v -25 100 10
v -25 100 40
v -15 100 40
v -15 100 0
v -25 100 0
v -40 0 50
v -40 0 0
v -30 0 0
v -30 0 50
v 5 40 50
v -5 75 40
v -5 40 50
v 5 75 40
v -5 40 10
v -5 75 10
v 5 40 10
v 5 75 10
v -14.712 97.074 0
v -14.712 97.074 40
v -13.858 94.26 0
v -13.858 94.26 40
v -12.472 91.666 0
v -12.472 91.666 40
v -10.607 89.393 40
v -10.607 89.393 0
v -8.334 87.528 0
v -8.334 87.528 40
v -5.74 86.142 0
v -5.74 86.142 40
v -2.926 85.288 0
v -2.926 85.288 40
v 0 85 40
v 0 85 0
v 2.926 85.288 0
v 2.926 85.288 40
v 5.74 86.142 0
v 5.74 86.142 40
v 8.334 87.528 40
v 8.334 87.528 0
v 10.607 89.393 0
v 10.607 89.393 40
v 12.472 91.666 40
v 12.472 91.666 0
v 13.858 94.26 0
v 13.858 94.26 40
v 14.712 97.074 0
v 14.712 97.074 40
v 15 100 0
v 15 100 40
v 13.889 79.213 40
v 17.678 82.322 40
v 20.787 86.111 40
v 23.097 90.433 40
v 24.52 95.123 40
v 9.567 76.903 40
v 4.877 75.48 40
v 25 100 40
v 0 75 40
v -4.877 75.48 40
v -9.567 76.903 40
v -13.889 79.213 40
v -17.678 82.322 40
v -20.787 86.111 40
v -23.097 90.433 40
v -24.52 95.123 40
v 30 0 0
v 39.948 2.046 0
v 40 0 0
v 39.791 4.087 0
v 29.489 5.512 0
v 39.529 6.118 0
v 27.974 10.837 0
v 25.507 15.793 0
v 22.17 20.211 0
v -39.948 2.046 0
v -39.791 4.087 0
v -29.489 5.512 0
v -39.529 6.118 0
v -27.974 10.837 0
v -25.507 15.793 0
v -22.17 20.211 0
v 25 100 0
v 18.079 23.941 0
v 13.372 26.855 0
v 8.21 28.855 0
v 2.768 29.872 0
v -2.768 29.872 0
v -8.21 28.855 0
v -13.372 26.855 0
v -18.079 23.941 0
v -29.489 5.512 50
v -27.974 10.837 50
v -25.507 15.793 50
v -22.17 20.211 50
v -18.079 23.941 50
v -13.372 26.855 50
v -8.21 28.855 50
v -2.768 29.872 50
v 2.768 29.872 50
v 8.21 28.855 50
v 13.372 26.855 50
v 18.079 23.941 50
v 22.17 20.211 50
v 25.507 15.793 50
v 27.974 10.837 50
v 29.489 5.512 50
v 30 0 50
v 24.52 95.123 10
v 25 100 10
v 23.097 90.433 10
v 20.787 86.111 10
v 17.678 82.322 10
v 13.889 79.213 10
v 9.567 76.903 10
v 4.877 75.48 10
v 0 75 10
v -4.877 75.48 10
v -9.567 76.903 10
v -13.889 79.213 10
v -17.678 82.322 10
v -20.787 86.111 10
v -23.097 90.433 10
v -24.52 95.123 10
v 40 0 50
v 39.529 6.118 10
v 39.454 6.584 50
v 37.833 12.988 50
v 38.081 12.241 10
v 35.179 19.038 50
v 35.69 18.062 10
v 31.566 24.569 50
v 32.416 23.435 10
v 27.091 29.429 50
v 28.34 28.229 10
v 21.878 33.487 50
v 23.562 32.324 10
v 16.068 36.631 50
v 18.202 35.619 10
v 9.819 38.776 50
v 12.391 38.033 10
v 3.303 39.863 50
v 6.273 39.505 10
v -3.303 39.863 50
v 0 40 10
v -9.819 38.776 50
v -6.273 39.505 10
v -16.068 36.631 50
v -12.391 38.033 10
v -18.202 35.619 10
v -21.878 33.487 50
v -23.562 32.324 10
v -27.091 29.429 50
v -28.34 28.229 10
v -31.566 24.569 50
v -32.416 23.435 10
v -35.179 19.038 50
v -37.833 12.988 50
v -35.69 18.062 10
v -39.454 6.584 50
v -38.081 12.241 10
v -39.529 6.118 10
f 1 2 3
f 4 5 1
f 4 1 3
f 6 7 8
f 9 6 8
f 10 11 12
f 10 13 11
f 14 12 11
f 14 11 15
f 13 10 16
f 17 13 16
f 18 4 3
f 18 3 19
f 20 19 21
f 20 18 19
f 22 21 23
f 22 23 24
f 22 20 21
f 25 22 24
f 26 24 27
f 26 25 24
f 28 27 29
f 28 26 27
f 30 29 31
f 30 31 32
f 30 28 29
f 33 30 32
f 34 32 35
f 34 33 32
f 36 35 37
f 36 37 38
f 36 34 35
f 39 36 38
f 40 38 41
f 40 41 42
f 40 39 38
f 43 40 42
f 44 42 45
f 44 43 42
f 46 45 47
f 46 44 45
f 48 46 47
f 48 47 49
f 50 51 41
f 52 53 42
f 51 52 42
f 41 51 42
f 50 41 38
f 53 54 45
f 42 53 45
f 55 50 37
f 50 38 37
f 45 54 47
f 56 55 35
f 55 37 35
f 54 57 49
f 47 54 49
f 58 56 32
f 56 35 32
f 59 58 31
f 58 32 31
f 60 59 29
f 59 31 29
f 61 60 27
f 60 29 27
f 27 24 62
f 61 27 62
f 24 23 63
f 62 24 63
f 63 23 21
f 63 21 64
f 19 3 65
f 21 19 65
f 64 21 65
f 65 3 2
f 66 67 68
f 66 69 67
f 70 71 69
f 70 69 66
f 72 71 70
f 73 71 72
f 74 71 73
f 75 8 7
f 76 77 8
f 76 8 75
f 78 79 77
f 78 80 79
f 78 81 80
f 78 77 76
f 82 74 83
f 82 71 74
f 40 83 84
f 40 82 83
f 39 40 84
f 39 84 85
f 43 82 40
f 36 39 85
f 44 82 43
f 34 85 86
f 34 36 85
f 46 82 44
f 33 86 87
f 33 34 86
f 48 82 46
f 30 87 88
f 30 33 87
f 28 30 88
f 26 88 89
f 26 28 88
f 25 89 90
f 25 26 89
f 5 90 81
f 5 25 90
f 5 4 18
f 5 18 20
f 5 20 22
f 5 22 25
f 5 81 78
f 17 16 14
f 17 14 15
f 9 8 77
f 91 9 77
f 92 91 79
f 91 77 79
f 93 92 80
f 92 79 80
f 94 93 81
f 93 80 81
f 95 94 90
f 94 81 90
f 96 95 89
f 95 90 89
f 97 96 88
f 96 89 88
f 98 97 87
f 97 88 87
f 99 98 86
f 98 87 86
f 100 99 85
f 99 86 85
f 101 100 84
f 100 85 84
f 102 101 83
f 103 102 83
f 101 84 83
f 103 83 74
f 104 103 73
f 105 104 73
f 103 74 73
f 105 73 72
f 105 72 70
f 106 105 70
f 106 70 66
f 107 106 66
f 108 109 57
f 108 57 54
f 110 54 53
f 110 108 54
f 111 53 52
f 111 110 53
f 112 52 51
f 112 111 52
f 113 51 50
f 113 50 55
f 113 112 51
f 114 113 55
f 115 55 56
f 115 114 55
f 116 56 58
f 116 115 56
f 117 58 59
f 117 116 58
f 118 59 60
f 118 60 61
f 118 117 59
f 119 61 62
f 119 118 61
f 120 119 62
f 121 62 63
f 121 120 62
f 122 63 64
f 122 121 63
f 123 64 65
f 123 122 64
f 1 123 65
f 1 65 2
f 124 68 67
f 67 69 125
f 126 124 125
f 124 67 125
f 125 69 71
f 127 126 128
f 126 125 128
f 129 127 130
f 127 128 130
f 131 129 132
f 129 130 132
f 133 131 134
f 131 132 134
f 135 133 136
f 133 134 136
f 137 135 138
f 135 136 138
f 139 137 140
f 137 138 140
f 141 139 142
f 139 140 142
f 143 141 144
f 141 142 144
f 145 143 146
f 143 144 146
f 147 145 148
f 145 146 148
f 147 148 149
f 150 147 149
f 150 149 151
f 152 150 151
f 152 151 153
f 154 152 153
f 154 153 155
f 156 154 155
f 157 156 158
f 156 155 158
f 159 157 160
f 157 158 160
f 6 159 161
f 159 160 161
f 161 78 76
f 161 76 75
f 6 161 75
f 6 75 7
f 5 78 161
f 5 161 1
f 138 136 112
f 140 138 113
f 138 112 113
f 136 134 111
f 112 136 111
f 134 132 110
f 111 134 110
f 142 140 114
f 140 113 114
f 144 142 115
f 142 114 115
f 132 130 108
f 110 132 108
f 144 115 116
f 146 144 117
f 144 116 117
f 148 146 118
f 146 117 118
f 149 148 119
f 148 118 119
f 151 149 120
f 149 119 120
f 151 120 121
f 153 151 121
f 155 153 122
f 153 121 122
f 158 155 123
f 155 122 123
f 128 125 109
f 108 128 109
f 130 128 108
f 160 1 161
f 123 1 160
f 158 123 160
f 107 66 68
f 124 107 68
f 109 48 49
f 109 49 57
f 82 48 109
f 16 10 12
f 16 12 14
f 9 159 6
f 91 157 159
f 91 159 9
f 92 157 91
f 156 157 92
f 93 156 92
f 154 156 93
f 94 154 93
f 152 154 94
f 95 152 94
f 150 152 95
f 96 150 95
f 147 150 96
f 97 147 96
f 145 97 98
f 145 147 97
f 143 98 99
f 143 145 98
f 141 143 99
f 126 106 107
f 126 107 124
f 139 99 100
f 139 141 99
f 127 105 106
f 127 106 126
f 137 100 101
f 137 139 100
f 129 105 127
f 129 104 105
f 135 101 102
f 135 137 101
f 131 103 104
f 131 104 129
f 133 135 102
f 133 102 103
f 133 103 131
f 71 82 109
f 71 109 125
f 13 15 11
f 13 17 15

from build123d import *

# Parameters (mm, degrees)
BOSS_EXTRUDE1_DEPTH = 50
BOSS_EXTRUDE4_DEPTH = 40
BOSS_EXTRUDE6_DEPTH = 10
BOSS_EXTRUDE8_DEPTH = 5


with BuildPart() as part:
    # Sketch1 → Boss-Extrude1 (new body)
    with BuildSketch(Plane.XY):
        with BuildLine():
            Line((-40, 0), (-30, 0))
            ThreePointArc((-30, 0), (0, 30), (30, 0))
            Line((30, 0), (40, 0))
            ThreePointArc((40, 0), (0, 40), (-40, 0))
        make_face()
    extrude(amount=BOSS_EXTRUDE1_DEPTH)



with BuildPart() as body_2:
    # Sketch2 → Boss-Extrude4 (new body)
    with BuildSketch(Plane.XY):
        with BuildLine():
            Line((-25, 100), (-15, 100))
            ThreePointArc((-15, 100), (0, 85), (15, 100))
            Line((15, 100), (25, 100))
            ThreePointArc((25, 100), (0, 75), (-25, 100))
        make_face()
    extrude(amount=BOSS_EXTRUDE4_DEPTH)


with BuildPart() as part_1:
    add(part.part)

    add(body_2.part)  # Boss-Extrude6 merges body 2
    # Sketch6 → Boss-Extrude6 (add)
    with BuildSketch(Plane(origin=(0, 0, 0), x_dir=(-1, 0, 0), z_dir=(0, 0, -1))):
        with BuildLine():
            Line((-25, 100), (-39.529411765, 6.117647059))
            ThreePointArc((-39.529411765, 6.117647059), (0, 40), (39.529411765, 6.117647059))
            Line((39.529411765, 6.117647059), (25, 100))
            ThreePointArc((25, 100), (0, 75), (-25, 100))
        make_face()
    extrude(amount=-BOSS_EXTRUDE6_DEPTH)


with BuildPart() as body_2_2:
    # Sketch7 → Boss-Extrude8 (new body, symmetric)
    with BuildSketch(Plane(origin=(0, 0, 0), x_dir=(0, 0, -1), z_dir=(1, 0, 0))):
        Polygon((-40, 75), (-50, 40), (-10, 40), (-10, 75), align=None)
    extrude(amount=BOSS_EXTRUDE8_DEPTH, both=True)


solid = Compound([part_1.part, body_2_2.part])
